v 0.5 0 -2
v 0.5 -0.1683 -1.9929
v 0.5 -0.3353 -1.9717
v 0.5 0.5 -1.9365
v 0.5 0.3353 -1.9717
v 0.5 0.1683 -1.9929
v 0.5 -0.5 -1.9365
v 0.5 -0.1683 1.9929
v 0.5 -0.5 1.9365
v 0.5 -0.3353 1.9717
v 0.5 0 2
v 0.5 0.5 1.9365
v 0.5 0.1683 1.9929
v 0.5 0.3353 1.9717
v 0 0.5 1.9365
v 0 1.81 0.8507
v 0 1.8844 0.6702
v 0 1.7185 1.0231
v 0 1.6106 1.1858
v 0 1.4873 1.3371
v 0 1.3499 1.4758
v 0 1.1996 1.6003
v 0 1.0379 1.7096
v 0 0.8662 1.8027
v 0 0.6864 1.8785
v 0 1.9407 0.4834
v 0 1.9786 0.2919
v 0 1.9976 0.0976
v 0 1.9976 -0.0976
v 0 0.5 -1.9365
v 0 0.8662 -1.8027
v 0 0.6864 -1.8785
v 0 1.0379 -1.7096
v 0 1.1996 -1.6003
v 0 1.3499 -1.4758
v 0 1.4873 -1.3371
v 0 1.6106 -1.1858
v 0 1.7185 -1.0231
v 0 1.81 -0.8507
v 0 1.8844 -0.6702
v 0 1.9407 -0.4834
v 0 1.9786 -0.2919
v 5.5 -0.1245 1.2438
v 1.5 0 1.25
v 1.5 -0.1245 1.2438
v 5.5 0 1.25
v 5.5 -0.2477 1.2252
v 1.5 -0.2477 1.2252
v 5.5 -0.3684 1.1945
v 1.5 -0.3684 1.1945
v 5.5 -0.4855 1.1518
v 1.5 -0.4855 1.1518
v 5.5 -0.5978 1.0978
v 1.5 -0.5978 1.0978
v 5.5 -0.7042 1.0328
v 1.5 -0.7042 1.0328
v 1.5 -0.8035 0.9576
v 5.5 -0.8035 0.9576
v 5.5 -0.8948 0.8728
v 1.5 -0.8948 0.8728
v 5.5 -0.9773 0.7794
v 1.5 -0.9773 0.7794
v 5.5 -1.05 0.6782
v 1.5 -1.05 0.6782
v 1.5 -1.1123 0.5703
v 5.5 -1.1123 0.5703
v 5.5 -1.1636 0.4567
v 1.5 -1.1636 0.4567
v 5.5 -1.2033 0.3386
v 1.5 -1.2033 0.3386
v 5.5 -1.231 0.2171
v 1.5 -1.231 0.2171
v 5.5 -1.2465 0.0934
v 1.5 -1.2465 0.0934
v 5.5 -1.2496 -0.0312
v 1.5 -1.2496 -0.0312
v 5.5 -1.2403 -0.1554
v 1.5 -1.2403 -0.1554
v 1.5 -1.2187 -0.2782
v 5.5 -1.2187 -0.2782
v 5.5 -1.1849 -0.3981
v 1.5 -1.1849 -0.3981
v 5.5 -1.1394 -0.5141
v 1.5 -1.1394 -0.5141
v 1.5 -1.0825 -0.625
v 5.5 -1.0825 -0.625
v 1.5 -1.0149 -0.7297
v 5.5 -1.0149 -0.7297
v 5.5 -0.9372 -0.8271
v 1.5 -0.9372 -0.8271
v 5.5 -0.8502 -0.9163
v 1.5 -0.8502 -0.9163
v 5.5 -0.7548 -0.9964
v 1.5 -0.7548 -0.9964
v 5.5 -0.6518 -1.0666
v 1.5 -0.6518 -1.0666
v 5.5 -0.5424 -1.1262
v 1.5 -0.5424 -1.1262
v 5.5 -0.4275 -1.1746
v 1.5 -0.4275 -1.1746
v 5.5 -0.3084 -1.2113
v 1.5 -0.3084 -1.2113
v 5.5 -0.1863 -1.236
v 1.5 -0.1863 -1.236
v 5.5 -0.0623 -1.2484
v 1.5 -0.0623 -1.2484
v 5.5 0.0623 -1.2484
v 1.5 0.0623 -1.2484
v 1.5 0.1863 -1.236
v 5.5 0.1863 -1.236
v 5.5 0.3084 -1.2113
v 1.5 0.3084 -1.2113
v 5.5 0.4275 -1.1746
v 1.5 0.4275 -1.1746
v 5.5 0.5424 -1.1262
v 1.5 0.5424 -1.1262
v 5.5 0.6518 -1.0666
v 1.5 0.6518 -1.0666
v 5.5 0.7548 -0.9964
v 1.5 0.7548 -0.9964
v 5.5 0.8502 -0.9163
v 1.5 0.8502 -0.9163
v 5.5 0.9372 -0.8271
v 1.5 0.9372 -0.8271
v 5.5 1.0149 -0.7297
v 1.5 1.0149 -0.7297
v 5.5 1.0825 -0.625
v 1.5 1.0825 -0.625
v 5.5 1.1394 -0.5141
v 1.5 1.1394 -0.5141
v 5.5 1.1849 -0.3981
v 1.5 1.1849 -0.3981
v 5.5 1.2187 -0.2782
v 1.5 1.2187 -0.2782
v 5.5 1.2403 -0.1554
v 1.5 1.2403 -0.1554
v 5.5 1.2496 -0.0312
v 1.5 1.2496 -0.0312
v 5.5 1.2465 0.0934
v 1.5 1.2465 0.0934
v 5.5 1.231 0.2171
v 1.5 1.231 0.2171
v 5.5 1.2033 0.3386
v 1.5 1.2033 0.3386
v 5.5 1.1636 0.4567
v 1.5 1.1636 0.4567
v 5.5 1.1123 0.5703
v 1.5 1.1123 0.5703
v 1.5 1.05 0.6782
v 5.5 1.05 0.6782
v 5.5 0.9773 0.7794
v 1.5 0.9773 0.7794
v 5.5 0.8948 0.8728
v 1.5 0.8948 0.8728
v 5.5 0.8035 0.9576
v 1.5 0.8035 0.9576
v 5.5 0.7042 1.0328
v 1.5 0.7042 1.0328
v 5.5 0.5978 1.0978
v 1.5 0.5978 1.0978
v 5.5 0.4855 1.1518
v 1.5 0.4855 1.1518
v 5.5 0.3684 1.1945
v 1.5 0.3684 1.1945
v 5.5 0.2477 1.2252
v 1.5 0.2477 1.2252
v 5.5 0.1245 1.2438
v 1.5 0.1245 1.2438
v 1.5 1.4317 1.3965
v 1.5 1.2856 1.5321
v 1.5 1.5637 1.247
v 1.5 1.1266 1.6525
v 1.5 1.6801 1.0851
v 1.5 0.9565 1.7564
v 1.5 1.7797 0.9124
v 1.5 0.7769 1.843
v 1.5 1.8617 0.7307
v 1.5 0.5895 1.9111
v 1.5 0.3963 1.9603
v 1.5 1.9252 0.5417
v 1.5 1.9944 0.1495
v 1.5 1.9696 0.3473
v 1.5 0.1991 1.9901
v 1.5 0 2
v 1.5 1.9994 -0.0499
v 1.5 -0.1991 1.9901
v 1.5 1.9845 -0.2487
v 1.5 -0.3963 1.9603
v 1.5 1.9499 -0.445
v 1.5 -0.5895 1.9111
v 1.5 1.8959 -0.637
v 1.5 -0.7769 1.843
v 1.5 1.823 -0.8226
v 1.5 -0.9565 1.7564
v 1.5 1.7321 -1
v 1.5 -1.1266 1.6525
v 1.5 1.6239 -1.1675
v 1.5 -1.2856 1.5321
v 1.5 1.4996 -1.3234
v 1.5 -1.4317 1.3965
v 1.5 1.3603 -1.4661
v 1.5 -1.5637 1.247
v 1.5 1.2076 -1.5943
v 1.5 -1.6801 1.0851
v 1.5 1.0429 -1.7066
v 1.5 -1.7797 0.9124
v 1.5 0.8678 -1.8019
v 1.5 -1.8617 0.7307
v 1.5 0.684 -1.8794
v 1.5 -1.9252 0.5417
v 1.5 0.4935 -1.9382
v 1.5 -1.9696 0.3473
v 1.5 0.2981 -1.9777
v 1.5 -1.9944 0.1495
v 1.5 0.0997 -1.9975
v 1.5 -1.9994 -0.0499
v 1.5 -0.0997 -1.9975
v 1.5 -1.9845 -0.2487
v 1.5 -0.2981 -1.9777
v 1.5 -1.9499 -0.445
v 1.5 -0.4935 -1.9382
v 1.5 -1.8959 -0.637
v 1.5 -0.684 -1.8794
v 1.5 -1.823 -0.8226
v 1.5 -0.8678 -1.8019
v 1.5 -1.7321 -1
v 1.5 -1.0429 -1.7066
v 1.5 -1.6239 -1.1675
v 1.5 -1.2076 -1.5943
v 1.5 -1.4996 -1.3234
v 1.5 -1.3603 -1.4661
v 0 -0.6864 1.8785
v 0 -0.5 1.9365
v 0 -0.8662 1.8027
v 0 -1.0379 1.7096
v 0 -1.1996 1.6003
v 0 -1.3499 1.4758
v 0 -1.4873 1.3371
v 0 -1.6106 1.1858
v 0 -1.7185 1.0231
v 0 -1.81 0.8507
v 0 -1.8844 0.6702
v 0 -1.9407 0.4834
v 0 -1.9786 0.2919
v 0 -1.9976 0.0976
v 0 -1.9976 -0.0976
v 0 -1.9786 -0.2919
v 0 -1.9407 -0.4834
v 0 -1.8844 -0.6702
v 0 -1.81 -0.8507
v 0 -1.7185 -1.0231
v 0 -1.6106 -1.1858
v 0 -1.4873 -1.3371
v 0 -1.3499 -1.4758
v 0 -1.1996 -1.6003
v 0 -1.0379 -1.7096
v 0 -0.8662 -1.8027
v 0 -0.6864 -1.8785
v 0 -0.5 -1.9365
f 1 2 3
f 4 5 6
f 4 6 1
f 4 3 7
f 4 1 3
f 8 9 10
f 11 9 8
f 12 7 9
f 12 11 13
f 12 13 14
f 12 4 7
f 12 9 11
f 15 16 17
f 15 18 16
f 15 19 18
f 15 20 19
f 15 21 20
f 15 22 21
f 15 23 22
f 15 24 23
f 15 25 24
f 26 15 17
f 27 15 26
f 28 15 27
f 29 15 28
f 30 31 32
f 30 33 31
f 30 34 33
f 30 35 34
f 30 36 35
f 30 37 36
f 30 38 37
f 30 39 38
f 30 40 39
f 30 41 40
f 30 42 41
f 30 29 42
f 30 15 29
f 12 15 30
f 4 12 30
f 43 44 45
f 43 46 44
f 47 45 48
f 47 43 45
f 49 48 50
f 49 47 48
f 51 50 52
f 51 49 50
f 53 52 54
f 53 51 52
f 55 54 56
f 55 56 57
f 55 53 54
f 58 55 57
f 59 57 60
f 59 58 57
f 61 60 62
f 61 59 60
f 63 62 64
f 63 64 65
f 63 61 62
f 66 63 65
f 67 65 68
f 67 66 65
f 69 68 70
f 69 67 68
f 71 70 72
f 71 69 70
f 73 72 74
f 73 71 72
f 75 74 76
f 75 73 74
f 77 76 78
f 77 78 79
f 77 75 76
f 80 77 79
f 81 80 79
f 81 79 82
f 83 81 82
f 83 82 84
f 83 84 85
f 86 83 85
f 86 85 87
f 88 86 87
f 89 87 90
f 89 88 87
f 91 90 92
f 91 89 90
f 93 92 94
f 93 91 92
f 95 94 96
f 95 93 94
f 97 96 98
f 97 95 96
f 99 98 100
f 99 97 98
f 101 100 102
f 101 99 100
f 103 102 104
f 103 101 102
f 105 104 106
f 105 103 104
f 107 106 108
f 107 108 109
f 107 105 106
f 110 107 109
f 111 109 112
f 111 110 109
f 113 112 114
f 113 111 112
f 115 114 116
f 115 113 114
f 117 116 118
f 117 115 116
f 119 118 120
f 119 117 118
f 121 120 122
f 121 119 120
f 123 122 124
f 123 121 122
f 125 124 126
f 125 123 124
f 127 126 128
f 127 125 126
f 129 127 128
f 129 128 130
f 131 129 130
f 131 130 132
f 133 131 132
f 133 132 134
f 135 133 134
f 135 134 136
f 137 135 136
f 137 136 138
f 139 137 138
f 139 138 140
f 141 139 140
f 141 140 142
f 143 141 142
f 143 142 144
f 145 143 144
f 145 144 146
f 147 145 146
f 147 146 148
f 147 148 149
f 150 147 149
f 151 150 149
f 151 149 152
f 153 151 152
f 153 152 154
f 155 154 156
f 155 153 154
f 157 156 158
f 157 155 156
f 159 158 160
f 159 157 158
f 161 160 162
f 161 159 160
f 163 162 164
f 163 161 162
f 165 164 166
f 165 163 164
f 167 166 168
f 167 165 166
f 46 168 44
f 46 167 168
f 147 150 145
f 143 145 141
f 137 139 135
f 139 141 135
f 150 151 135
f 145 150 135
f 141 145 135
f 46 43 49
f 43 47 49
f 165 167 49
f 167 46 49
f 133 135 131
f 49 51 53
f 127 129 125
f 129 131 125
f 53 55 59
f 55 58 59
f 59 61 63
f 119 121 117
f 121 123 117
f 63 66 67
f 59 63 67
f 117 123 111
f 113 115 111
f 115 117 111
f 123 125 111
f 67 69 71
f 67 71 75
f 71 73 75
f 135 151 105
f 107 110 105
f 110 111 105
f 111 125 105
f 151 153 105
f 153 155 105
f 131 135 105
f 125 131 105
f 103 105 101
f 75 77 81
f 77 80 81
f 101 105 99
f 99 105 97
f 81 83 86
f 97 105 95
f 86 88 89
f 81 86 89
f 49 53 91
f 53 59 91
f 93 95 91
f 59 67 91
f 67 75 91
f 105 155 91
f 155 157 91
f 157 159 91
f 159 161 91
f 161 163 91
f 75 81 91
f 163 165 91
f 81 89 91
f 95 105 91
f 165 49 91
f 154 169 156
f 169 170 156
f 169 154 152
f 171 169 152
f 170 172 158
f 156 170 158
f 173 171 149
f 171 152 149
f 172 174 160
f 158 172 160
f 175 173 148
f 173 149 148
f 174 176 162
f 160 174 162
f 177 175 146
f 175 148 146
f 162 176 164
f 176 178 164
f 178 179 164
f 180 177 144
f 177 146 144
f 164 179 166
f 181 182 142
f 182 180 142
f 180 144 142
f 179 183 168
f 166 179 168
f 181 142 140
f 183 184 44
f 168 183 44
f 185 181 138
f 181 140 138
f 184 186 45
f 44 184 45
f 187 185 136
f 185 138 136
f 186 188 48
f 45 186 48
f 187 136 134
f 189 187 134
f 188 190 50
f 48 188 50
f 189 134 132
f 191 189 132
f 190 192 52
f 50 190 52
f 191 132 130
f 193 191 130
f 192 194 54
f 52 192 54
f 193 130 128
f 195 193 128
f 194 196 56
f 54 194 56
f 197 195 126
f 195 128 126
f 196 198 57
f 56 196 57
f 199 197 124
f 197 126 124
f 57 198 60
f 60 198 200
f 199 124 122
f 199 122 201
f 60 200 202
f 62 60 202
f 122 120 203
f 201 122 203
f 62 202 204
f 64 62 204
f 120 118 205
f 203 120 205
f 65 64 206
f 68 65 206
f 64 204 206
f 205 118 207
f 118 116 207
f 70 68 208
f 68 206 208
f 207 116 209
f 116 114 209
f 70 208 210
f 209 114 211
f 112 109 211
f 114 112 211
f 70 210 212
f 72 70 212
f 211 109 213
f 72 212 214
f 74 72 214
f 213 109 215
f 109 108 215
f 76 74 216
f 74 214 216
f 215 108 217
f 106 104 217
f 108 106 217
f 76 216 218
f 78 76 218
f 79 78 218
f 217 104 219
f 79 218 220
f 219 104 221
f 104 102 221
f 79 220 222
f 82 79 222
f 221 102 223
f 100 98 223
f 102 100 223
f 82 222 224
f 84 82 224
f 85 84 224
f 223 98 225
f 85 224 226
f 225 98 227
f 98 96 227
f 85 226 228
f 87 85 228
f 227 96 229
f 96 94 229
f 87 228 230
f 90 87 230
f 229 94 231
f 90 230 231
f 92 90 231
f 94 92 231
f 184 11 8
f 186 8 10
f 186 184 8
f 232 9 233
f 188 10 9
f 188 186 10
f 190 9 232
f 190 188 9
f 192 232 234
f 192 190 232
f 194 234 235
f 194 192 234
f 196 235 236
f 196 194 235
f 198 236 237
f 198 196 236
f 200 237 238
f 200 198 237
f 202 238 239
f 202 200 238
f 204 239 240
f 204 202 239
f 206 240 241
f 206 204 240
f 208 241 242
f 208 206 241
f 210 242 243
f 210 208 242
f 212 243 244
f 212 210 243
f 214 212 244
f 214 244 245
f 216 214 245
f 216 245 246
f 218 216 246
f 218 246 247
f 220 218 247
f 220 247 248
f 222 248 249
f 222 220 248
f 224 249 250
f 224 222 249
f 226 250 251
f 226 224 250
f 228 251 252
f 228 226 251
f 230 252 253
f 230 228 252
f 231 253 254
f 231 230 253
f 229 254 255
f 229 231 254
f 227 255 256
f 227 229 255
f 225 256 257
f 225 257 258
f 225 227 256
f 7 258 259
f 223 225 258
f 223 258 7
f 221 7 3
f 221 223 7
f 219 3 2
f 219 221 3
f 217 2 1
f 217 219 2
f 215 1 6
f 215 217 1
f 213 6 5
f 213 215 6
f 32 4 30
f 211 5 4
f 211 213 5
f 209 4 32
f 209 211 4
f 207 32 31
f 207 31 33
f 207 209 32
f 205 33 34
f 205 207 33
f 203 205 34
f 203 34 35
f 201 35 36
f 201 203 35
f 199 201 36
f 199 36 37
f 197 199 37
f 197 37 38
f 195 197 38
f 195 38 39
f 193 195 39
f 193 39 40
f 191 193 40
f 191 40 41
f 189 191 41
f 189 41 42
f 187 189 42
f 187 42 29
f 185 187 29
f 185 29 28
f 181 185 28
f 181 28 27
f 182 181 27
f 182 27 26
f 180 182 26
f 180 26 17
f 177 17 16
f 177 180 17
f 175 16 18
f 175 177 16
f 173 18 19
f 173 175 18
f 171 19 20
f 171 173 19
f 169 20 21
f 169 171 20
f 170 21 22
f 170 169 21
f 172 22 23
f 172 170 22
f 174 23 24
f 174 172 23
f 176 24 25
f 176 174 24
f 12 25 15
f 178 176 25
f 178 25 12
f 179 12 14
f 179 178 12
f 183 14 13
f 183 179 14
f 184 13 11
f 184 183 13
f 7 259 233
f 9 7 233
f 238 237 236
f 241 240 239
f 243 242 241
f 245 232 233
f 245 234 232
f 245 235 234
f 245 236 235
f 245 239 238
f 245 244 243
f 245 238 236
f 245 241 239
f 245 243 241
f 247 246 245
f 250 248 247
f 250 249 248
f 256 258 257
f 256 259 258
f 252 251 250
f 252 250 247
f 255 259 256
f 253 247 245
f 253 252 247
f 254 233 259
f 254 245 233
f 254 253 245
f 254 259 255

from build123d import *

# Parameters (mm, degrees)
CUT_EXTRUDE_2_DEPTH = 0.5


with BuildPart() as part:
    # Эскиз2 → Повернуть1 (revolve)
    with BuildSketch(Plane(origin=(0, 0, 0), x_dir=(1, 0, 0), z_dir=(0, 1, 0))):
        Polygon((0, 2), (0, 0), (5.5, 0), (5.5, 1.25), (1.5, 1.25), (1.5, 2), align=None)
    revolve(axis=Axis((0, 0, 0), (1, 0, 0)))

    # Эскиз3 → Вырез-Вытянуть2 (cut)
    with BuildSketch(Plane.ZY):
        with BuildLine():
            ThreePointArc((-1.936491673, 0.5), (-2, 0), (-1.936491673, -0.5))
            Line((-1.936491673, -0.5), (1.936491673, -0.5))
            ThreePointArc((1.936491673, -0.5), (1.984059393, -0.252008585), (2, 0))
            ThreePointArc((2, 0), (1.984059393, 0.252008585), (1.936491673, 0.5))
            Line((1.936491673, 0.5), (-1.936491673, 0.5))
        make_face()
    extrude(amount=-CUT_EXTRUDE_2_DEPTH, mode=Mode.SUBTRACT)


solid = part.part
